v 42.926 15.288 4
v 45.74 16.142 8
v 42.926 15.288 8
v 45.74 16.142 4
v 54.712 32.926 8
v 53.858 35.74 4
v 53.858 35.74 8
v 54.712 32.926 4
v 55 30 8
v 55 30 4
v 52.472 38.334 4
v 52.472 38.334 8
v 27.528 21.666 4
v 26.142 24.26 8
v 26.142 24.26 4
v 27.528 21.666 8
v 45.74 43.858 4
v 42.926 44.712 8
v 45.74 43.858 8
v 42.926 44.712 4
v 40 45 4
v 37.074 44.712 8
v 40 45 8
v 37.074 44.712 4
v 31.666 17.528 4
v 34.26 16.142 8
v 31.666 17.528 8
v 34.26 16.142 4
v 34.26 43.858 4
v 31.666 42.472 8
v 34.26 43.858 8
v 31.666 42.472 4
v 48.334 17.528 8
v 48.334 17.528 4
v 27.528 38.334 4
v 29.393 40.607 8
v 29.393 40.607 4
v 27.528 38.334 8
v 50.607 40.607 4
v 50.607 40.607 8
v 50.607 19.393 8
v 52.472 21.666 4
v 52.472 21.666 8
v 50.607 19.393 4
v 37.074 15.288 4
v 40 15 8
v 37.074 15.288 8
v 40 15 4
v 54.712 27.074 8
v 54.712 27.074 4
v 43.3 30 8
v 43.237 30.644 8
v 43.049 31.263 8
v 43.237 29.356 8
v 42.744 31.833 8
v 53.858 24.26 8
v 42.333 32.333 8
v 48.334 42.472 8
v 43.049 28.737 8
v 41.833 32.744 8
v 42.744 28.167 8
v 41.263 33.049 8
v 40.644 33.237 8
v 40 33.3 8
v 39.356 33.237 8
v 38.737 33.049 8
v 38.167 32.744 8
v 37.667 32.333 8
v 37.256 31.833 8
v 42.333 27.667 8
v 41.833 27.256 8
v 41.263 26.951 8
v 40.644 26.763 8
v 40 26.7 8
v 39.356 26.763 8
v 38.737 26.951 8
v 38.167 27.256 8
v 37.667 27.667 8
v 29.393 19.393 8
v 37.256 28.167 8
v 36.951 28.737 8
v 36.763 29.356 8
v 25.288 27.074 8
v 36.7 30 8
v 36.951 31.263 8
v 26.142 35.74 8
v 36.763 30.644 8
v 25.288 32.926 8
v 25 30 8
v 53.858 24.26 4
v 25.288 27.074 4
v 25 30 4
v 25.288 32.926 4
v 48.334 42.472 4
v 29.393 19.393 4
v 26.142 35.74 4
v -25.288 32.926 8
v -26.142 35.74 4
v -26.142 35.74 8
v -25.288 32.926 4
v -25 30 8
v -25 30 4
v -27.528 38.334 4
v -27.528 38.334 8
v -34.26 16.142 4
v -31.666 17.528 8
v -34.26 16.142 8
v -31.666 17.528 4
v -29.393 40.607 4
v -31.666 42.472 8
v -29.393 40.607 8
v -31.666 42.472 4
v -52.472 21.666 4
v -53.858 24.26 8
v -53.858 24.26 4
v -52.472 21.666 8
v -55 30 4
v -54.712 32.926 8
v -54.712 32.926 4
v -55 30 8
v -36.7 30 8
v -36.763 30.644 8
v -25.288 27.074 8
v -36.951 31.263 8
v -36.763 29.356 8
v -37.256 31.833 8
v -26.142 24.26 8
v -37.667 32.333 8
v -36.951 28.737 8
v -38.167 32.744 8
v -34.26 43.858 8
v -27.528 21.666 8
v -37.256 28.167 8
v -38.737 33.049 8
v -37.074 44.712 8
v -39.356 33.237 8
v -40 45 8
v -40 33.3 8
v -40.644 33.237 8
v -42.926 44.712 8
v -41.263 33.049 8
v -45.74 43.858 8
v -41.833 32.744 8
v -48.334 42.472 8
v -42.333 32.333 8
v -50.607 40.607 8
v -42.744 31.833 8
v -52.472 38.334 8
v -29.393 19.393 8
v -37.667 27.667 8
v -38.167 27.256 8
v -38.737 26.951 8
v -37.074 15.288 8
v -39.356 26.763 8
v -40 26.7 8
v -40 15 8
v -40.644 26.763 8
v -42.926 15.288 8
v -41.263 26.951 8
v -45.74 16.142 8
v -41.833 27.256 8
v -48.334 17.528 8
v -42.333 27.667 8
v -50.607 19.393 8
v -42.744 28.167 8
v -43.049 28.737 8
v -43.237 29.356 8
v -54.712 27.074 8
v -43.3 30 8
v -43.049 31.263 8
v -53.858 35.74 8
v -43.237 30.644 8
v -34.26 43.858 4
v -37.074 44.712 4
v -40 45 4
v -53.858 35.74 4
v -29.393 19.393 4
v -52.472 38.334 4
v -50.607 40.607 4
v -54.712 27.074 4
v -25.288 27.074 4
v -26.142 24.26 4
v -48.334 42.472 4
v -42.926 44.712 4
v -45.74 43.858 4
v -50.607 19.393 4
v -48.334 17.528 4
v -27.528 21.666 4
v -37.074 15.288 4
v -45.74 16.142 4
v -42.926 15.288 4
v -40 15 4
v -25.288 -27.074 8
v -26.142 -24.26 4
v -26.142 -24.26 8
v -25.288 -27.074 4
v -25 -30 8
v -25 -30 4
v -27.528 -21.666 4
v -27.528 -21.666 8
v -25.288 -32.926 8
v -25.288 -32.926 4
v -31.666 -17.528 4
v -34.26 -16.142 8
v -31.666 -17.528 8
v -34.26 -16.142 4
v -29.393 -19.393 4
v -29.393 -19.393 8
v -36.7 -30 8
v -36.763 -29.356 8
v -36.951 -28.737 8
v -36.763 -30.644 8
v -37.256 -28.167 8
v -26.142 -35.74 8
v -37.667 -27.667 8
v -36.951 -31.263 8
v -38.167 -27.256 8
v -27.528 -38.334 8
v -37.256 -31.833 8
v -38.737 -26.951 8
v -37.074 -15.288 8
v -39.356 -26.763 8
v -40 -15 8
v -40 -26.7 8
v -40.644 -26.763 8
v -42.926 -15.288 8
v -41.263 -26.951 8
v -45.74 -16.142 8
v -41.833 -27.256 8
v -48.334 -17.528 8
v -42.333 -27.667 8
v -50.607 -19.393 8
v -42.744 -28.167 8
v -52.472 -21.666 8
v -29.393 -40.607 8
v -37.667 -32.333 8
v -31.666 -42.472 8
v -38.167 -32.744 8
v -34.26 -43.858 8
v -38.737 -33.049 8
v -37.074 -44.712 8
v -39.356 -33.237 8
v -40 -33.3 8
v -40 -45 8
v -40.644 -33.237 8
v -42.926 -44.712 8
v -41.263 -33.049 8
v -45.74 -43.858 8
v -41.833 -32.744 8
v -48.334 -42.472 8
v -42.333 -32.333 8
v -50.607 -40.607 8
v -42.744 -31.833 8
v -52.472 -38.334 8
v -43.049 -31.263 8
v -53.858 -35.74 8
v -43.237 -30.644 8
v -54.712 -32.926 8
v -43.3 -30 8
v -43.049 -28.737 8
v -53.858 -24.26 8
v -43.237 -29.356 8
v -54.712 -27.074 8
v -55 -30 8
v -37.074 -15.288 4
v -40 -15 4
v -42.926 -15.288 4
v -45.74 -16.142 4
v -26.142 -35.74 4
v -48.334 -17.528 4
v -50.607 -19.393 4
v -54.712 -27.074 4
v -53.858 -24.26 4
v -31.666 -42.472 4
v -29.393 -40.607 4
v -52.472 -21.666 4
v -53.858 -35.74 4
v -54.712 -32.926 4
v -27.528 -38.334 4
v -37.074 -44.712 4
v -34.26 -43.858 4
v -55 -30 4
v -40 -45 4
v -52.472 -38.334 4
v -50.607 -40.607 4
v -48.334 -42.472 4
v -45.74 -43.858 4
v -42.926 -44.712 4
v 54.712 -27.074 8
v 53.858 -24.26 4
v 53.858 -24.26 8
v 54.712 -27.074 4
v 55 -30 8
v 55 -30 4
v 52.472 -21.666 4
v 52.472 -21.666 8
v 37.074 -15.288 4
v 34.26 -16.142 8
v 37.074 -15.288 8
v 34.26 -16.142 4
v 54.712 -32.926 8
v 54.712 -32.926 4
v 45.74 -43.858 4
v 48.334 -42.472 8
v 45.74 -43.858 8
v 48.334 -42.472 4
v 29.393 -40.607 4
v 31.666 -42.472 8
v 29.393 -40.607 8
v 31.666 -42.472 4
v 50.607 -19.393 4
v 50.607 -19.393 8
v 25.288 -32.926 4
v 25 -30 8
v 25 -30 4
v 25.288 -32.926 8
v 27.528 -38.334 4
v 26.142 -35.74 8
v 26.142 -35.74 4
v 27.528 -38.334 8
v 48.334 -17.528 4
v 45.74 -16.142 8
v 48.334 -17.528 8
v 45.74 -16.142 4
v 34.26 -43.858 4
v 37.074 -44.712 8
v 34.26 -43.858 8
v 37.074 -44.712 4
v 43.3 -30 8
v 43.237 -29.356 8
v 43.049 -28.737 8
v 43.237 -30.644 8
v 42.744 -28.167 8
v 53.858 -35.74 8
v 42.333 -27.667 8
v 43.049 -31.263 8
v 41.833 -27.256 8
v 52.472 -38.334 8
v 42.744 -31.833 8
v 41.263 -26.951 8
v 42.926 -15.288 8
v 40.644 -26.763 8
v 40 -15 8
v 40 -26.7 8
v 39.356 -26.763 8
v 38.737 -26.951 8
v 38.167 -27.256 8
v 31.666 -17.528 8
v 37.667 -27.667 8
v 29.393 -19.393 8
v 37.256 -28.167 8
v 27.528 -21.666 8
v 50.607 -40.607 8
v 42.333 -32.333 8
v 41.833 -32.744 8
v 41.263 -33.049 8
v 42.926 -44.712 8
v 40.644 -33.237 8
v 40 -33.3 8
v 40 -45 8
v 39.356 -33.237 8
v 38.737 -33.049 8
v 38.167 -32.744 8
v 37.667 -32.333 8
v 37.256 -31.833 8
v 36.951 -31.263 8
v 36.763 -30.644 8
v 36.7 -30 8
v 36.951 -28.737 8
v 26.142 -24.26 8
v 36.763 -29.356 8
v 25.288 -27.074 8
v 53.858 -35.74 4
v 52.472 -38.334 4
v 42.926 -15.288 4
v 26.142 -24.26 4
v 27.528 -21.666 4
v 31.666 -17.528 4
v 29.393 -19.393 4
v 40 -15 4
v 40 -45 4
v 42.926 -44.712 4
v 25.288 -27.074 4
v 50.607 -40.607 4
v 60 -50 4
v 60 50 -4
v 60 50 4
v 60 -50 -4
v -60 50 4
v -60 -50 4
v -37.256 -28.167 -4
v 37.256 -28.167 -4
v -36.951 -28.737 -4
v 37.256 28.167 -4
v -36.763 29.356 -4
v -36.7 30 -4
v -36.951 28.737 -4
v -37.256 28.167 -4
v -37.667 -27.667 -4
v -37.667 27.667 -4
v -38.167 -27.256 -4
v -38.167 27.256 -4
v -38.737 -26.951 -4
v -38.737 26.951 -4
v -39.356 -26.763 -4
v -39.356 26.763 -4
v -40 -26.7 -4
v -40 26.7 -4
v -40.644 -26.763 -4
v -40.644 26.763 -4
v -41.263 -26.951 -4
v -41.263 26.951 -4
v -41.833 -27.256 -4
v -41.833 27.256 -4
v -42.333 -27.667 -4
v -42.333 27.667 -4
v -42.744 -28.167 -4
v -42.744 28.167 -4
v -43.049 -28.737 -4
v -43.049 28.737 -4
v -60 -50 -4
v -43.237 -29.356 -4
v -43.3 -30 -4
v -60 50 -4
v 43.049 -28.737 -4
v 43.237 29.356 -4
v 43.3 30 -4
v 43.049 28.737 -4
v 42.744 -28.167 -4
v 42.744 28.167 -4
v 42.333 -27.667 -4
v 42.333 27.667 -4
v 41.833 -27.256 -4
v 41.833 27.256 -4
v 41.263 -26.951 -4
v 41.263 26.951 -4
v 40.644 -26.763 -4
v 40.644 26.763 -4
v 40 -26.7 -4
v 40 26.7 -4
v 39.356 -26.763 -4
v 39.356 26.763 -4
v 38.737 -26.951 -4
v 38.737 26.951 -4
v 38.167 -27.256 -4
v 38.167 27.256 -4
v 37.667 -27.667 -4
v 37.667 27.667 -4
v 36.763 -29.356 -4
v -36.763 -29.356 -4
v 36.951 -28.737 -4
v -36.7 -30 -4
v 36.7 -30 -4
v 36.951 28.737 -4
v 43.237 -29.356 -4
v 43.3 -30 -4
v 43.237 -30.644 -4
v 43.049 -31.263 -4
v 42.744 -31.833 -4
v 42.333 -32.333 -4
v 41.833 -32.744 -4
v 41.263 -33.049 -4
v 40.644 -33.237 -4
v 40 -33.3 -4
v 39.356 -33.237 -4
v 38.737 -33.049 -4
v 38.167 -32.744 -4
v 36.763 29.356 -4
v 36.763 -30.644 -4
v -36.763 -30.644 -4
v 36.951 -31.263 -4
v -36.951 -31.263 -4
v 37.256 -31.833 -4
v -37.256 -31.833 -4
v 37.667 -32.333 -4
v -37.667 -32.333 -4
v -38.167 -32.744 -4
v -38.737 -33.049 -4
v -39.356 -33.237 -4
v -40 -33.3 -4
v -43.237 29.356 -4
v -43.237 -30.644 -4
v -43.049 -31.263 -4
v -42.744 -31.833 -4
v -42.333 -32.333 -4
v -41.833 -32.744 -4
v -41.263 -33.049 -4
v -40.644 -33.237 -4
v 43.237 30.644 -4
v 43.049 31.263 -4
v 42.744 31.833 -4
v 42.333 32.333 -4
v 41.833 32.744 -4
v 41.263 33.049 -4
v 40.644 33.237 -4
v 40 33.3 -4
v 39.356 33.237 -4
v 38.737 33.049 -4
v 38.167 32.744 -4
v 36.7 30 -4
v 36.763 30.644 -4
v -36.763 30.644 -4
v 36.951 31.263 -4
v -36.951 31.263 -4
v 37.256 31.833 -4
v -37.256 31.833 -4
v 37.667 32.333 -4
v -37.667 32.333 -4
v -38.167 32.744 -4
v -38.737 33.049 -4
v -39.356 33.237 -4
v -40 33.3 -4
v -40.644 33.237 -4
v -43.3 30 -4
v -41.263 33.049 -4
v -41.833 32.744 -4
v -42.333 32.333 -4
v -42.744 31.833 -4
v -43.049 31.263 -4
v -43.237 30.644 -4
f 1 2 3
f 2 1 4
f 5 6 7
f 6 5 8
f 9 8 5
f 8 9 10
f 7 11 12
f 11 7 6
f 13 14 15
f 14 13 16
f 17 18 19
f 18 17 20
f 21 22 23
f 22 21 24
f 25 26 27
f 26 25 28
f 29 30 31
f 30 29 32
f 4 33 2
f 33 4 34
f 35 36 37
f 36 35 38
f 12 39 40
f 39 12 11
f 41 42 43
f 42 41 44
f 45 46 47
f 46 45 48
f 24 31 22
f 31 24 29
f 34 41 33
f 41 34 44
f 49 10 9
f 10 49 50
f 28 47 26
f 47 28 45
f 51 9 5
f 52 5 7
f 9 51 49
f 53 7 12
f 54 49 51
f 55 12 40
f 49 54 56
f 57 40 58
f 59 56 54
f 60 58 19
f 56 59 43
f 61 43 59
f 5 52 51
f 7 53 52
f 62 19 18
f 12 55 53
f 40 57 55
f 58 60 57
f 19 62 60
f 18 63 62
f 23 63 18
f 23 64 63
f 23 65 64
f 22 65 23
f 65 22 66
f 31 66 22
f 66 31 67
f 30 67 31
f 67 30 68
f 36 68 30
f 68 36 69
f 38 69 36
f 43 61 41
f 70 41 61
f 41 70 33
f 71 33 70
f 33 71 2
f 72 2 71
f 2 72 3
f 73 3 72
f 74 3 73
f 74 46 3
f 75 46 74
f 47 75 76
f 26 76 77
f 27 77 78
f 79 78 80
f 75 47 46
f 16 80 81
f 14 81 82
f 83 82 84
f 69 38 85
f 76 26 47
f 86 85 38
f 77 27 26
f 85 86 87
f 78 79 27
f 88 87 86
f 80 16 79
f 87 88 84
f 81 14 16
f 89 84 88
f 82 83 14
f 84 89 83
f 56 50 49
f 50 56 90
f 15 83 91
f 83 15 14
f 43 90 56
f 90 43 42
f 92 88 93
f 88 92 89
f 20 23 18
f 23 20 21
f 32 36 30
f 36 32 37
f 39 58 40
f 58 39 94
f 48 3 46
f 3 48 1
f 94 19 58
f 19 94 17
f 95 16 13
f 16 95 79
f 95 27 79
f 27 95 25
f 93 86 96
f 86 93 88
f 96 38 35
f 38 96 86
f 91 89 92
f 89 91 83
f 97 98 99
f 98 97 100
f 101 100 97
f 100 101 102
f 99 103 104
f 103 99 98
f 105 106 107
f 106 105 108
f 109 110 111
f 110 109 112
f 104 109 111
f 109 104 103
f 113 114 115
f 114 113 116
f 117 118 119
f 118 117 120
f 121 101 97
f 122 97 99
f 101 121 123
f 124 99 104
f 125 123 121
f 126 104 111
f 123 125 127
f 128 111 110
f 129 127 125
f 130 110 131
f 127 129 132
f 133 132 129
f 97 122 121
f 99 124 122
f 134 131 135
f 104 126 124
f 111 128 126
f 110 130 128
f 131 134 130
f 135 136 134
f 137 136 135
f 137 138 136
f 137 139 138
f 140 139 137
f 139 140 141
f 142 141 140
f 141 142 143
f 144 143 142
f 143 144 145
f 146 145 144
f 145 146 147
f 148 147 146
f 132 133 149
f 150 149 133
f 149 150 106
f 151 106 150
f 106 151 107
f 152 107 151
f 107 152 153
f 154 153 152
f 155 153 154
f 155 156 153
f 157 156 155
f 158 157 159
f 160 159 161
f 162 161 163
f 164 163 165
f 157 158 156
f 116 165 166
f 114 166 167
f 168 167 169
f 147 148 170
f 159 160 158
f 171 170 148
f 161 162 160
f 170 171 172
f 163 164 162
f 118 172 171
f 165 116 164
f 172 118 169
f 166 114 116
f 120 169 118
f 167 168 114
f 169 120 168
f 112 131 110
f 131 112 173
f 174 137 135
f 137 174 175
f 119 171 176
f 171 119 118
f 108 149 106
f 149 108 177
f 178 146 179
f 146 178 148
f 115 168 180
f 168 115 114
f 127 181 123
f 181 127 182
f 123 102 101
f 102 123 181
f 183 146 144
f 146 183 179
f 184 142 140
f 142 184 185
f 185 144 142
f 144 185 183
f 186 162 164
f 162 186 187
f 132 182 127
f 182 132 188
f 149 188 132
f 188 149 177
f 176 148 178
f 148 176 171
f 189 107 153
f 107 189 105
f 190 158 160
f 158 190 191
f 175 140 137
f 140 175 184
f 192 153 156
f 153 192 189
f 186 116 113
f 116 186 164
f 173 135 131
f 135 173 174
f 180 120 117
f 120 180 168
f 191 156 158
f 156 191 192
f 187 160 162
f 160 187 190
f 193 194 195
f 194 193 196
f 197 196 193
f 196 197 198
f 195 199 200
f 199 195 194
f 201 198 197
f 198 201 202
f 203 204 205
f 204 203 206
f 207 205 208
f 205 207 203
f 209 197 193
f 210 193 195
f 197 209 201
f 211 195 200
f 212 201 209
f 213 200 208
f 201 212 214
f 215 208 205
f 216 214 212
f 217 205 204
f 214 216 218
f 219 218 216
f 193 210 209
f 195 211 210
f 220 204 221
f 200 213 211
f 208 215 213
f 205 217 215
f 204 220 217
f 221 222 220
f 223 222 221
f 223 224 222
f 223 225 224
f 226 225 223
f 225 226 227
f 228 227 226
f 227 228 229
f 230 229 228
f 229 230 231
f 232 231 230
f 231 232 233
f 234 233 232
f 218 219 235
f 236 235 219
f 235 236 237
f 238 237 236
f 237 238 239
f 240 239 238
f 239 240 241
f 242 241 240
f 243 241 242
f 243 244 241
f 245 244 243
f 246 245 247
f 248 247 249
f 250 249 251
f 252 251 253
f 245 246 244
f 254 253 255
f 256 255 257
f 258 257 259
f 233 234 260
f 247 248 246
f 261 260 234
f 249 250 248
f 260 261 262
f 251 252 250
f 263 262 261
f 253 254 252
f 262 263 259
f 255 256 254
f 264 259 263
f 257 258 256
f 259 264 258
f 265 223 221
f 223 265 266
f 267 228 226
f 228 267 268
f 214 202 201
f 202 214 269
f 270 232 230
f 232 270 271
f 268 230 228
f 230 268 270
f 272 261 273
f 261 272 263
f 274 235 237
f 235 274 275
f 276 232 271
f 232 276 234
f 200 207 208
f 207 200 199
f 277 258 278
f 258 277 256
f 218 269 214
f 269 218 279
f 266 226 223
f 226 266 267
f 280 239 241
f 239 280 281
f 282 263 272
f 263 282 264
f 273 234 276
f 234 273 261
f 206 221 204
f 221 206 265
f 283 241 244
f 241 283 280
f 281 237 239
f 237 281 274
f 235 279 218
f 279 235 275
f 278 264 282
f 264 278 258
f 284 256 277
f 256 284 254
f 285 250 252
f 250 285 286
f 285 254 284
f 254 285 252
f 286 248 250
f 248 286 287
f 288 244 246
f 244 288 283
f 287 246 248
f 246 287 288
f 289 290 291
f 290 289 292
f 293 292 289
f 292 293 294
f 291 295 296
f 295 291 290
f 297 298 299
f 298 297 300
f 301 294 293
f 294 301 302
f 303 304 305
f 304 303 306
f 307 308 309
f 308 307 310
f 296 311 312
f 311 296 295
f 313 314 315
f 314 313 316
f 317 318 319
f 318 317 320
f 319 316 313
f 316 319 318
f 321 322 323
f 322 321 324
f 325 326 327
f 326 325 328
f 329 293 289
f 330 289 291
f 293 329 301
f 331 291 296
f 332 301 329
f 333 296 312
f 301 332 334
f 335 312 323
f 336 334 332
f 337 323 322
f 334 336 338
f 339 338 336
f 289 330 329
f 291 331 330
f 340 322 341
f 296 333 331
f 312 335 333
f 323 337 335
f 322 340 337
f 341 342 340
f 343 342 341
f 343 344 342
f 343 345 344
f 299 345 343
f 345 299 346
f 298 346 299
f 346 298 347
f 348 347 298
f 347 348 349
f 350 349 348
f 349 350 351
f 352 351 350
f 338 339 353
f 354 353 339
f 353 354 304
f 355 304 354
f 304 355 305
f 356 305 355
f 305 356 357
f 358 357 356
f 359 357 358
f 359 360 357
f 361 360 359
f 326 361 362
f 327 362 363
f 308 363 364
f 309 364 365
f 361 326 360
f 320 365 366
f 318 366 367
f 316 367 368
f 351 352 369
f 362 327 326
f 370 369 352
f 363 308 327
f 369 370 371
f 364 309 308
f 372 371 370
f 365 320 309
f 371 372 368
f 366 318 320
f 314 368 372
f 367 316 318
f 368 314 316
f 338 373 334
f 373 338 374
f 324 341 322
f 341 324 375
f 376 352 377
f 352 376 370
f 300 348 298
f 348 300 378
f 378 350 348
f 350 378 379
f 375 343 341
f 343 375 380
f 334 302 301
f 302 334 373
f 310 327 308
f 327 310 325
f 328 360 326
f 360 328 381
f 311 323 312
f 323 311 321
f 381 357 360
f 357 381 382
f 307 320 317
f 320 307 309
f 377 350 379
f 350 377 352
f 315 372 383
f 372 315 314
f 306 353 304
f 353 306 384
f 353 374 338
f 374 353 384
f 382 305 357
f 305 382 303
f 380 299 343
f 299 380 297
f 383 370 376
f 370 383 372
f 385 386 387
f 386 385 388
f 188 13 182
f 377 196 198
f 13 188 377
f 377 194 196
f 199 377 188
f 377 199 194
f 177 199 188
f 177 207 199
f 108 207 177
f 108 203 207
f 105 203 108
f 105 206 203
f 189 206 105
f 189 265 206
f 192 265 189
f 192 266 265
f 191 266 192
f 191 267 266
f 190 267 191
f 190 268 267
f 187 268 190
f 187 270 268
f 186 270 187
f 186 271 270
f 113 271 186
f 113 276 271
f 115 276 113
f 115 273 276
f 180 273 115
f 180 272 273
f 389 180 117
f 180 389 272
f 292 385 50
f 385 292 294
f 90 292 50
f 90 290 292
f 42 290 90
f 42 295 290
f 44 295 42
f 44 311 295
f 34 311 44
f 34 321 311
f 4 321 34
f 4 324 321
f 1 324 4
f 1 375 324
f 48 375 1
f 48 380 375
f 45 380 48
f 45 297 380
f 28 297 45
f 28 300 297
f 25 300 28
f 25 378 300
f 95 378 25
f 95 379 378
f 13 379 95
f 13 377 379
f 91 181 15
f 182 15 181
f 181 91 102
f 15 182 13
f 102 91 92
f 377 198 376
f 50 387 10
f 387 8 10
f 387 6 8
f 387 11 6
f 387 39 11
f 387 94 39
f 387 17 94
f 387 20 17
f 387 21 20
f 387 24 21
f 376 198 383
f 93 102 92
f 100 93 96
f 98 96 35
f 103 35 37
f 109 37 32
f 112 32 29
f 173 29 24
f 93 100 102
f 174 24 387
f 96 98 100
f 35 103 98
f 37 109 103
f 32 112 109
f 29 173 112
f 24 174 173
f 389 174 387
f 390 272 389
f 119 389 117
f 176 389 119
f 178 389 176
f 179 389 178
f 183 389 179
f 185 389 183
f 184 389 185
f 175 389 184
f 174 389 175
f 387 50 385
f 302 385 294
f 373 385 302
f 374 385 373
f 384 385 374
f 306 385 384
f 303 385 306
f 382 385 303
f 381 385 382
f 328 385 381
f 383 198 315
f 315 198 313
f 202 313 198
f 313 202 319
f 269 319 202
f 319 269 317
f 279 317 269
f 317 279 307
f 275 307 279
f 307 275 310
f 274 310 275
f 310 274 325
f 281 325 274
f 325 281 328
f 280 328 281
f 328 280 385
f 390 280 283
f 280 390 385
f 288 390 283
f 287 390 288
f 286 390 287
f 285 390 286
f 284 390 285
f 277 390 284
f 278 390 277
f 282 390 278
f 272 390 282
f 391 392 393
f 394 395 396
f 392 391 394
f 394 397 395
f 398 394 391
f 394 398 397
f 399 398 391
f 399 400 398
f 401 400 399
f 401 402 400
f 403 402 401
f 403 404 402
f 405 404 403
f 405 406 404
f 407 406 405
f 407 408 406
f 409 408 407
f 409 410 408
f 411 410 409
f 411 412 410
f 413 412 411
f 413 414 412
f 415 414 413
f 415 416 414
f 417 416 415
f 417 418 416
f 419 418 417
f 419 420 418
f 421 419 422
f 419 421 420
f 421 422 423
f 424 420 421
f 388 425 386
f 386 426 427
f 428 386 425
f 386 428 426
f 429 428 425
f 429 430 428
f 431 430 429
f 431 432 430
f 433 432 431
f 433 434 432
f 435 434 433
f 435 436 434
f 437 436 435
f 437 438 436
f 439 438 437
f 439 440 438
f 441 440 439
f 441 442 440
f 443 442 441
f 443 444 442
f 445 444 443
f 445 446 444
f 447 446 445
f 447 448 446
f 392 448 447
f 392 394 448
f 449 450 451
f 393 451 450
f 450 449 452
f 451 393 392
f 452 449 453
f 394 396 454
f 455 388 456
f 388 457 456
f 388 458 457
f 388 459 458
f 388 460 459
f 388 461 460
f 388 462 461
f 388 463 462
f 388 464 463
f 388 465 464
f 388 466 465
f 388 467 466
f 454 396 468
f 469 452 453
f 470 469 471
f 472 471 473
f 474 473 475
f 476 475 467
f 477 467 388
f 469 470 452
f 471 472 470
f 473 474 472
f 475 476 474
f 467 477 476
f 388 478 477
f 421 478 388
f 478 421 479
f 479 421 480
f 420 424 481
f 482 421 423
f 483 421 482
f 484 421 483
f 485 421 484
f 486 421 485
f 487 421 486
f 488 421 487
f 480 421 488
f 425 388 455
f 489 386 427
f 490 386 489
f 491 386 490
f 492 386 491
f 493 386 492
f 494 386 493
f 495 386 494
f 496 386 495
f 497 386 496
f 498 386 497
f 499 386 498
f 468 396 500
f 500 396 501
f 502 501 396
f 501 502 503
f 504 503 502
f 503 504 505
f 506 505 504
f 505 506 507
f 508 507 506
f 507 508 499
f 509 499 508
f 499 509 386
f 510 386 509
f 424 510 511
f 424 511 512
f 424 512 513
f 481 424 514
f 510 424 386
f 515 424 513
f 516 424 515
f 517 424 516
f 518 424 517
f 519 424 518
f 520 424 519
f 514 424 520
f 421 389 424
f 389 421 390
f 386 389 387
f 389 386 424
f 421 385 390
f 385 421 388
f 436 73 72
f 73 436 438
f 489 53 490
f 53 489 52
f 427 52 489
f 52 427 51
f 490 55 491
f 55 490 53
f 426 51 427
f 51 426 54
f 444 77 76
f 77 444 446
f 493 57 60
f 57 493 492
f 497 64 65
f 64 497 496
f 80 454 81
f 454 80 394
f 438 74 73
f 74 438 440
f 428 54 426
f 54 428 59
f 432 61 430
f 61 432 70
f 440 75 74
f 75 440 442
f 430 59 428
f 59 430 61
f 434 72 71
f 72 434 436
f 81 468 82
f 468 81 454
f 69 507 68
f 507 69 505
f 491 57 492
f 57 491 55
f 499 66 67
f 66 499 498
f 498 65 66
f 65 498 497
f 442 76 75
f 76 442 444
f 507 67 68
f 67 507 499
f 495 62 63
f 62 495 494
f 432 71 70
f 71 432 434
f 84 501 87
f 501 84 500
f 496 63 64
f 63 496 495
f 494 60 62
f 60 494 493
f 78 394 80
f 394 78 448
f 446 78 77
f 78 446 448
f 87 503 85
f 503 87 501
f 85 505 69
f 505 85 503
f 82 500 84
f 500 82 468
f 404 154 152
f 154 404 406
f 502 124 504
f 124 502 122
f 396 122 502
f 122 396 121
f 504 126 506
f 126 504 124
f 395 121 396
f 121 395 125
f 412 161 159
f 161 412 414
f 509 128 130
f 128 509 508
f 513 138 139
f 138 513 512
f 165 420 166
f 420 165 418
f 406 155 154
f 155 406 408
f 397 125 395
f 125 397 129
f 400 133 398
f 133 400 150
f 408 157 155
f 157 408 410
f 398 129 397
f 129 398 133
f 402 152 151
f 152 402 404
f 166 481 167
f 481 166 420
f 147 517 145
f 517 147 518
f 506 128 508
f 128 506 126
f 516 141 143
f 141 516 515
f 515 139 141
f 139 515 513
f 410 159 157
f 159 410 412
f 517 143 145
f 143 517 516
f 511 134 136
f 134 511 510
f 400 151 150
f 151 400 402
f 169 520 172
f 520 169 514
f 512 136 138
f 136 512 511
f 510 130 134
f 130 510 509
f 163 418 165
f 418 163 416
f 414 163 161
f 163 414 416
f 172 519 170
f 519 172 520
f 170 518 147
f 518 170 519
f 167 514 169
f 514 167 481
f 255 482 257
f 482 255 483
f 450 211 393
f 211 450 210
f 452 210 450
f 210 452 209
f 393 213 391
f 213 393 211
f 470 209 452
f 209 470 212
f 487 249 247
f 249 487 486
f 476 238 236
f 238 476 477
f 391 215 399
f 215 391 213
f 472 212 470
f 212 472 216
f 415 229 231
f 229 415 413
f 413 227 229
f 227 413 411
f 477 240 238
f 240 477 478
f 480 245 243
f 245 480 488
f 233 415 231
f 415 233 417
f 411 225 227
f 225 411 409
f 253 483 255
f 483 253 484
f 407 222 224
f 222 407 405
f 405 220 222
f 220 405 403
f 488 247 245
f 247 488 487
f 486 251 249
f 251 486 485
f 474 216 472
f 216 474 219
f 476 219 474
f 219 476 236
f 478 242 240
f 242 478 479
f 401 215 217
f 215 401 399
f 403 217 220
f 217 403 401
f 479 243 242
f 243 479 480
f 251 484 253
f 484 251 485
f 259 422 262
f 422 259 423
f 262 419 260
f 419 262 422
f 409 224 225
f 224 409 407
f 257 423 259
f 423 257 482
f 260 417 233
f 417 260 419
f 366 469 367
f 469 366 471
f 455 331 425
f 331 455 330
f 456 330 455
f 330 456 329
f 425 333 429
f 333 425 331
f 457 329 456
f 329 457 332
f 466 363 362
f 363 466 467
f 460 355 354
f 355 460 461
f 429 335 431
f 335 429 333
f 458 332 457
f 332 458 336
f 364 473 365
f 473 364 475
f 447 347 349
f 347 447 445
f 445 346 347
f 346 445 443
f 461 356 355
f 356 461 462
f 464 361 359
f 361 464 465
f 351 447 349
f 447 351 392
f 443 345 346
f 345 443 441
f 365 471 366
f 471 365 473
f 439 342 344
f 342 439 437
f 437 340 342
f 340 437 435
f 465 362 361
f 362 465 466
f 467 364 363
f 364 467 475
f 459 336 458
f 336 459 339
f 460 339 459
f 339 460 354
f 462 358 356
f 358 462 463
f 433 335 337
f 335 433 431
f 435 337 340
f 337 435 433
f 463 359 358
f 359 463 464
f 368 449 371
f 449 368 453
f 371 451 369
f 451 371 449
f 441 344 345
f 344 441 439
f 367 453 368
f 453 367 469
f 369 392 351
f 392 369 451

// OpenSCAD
$fn = 32;

// ----------------------------------------------------------------------
// Anchor pads 120 x 100 x 12
// four corner bosses with anchor holes
// ----------------------------------------------------------------------

// --- parameters (mm) ---
plate = [120, 100, 8];  // base plate size (x, y, z)
pads = 4;               // boss count, one per corner
edge = 20;              // boss centre offset from the plate edge
boss_d = 30;            // boss diameter
boss_h = 4;             // boss height above the base plate
hole_d = 6.6;           // hole diameter

// --- derived feature positions (mm) ---
height = plate[2] + boss_h;      // = 12   overall height of the part
corner_x = plate[0] / 2 - edge;  // = 40   boss centre X
corner_y = plate[1] / 2 - edge;  // = 30   boss centre Y
feature_centers = [
  [corner_x, corner_y],
  [-corner_x, corner_y],
  [-corner_x, -corner_y],
  [corner_x, -corner_y]
];   // boss centres, anchor holes are drilled there

// base plate, four bosses standing on it, anchor holes all the way through
difference() {
  union() {
    cube(plate, center = true);
    for (centre = feature_centers)
      translate([centre[0], centre[1], plate[2] / 2 - 1])
        cylinder(d = boss_d, h = boss_h + 1);
  }
  for (centre = feature_centers)
    translate([centre[0], centre[1], -height])
      cylinder(d = hole_d, h = 2 * height + 2);  // through boss and plate
}
